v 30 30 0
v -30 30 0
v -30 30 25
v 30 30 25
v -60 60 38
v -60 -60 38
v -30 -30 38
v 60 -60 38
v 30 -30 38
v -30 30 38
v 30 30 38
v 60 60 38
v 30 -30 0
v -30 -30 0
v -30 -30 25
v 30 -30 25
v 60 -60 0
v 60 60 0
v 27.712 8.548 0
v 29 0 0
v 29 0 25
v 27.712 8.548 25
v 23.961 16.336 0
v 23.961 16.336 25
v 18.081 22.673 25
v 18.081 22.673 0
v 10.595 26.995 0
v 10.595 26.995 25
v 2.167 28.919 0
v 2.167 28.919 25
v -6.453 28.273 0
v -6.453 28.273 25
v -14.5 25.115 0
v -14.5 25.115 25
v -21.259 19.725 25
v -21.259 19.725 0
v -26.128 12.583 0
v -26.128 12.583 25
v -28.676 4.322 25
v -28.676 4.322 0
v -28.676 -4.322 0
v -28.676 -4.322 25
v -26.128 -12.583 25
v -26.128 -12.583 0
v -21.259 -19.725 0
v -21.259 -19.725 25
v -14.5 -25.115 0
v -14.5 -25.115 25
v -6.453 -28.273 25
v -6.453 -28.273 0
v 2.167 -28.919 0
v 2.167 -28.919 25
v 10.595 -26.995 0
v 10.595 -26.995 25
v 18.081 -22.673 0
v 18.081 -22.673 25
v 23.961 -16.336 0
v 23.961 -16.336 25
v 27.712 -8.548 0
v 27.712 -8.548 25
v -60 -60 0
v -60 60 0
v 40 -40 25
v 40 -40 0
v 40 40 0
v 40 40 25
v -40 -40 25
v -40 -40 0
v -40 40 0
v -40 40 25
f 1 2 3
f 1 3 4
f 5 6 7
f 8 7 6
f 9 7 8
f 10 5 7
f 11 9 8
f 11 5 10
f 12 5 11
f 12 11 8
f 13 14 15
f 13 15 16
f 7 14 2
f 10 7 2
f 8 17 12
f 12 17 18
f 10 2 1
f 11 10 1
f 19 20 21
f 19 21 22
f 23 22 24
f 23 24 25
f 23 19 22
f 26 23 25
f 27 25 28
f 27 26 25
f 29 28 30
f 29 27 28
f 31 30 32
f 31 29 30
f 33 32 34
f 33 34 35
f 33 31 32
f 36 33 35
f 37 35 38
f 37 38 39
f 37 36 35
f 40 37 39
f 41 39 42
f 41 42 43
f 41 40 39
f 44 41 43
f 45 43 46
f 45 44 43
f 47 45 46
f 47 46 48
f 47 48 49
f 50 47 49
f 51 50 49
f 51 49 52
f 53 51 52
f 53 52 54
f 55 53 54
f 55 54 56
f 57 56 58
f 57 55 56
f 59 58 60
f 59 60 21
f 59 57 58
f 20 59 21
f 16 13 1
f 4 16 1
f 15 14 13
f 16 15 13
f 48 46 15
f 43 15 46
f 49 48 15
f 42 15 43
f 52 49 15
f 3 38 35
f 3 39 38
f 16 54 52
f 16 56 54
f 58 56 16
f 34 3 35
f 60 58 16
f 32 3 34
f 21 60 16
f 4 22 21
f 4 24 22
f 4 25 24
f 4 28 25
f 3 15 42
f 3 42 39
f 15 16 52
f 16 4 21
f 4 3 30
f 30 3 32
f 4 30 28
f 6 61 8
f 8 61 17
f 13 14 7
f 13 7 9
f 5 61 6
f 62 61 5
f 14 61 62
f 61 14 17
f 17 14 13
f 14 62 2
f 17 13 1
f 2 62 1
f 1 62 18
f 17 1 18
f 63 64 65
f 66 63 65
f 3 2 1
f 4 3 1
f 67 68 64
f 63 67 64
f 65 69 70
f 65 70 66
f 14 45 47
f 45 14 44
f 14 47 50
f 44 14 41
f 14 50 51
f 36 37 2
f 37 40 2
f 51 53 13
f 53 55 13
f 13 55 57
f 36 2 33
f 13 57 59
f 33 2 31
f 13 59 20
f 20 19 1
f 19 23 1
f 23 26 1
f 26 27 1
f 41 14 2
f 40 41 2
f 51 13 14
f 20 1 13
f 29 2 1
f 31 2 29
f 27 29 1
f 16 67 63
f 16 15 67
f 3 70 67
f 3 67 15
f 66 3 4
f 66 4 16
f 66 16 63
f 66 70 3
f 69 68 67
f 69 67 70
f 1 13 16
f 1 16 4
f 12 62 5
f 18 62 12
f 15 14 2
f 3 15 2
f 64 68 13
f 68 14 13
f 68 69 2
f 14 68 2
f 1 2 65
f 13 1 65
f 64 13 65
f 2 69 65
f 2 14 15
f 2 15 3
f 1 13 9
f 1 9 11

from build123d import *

# Parameters (mm, degrees)
F0_W     = 120
F0_H     = 120
F0_W_2   = 80
F0_H_2   = 80
F0_W_3   = 60
F0_H_3   = 60
F1_DEPTH = 38
F2_DEPTH = 25
F0_R     = 29
F3_DEPTH = 25


with BuildPart() as f1:
    # F0 (on Top) → F1 (new body)
    with BuildSketch(Plane.XY):
        Rectangle(F0_W, F0_H)
        Rectangle(F0_W_2, F0_H_2, mode=Mode.SUBTRACT)
        Rectangle(F0_W_2, F0_H_2)
        Rectangle(F0_W_3, F0_H_3, mode=Mode.SUBTRACT)
    extrude(amount=F1_DEPTH)


with BuildPart() as f2:
    # F0 (on Top) → F2 (new body)
    with BuildSketch(Plane.XY):
        Rectangle(F0_W_2, F0_H_2)
        Rectangle(F0_W_3, F0_H_3, mode=Mode.SUBTRACT)
    extrude(amount=F2_DEPTH)


with BuildPart() as f3:
    # F0 (on Top) → F3 (new body)
    with BuildSketch(Plane.XY):
        Rectangle(F0_W_3, F0_H_3)
        Circle(F0_R, mode=Mode.SUBTRACT)
    extrude(amount=F3_DEPTH)


solid = Compound([f1.part, f2.part, f3.part])
